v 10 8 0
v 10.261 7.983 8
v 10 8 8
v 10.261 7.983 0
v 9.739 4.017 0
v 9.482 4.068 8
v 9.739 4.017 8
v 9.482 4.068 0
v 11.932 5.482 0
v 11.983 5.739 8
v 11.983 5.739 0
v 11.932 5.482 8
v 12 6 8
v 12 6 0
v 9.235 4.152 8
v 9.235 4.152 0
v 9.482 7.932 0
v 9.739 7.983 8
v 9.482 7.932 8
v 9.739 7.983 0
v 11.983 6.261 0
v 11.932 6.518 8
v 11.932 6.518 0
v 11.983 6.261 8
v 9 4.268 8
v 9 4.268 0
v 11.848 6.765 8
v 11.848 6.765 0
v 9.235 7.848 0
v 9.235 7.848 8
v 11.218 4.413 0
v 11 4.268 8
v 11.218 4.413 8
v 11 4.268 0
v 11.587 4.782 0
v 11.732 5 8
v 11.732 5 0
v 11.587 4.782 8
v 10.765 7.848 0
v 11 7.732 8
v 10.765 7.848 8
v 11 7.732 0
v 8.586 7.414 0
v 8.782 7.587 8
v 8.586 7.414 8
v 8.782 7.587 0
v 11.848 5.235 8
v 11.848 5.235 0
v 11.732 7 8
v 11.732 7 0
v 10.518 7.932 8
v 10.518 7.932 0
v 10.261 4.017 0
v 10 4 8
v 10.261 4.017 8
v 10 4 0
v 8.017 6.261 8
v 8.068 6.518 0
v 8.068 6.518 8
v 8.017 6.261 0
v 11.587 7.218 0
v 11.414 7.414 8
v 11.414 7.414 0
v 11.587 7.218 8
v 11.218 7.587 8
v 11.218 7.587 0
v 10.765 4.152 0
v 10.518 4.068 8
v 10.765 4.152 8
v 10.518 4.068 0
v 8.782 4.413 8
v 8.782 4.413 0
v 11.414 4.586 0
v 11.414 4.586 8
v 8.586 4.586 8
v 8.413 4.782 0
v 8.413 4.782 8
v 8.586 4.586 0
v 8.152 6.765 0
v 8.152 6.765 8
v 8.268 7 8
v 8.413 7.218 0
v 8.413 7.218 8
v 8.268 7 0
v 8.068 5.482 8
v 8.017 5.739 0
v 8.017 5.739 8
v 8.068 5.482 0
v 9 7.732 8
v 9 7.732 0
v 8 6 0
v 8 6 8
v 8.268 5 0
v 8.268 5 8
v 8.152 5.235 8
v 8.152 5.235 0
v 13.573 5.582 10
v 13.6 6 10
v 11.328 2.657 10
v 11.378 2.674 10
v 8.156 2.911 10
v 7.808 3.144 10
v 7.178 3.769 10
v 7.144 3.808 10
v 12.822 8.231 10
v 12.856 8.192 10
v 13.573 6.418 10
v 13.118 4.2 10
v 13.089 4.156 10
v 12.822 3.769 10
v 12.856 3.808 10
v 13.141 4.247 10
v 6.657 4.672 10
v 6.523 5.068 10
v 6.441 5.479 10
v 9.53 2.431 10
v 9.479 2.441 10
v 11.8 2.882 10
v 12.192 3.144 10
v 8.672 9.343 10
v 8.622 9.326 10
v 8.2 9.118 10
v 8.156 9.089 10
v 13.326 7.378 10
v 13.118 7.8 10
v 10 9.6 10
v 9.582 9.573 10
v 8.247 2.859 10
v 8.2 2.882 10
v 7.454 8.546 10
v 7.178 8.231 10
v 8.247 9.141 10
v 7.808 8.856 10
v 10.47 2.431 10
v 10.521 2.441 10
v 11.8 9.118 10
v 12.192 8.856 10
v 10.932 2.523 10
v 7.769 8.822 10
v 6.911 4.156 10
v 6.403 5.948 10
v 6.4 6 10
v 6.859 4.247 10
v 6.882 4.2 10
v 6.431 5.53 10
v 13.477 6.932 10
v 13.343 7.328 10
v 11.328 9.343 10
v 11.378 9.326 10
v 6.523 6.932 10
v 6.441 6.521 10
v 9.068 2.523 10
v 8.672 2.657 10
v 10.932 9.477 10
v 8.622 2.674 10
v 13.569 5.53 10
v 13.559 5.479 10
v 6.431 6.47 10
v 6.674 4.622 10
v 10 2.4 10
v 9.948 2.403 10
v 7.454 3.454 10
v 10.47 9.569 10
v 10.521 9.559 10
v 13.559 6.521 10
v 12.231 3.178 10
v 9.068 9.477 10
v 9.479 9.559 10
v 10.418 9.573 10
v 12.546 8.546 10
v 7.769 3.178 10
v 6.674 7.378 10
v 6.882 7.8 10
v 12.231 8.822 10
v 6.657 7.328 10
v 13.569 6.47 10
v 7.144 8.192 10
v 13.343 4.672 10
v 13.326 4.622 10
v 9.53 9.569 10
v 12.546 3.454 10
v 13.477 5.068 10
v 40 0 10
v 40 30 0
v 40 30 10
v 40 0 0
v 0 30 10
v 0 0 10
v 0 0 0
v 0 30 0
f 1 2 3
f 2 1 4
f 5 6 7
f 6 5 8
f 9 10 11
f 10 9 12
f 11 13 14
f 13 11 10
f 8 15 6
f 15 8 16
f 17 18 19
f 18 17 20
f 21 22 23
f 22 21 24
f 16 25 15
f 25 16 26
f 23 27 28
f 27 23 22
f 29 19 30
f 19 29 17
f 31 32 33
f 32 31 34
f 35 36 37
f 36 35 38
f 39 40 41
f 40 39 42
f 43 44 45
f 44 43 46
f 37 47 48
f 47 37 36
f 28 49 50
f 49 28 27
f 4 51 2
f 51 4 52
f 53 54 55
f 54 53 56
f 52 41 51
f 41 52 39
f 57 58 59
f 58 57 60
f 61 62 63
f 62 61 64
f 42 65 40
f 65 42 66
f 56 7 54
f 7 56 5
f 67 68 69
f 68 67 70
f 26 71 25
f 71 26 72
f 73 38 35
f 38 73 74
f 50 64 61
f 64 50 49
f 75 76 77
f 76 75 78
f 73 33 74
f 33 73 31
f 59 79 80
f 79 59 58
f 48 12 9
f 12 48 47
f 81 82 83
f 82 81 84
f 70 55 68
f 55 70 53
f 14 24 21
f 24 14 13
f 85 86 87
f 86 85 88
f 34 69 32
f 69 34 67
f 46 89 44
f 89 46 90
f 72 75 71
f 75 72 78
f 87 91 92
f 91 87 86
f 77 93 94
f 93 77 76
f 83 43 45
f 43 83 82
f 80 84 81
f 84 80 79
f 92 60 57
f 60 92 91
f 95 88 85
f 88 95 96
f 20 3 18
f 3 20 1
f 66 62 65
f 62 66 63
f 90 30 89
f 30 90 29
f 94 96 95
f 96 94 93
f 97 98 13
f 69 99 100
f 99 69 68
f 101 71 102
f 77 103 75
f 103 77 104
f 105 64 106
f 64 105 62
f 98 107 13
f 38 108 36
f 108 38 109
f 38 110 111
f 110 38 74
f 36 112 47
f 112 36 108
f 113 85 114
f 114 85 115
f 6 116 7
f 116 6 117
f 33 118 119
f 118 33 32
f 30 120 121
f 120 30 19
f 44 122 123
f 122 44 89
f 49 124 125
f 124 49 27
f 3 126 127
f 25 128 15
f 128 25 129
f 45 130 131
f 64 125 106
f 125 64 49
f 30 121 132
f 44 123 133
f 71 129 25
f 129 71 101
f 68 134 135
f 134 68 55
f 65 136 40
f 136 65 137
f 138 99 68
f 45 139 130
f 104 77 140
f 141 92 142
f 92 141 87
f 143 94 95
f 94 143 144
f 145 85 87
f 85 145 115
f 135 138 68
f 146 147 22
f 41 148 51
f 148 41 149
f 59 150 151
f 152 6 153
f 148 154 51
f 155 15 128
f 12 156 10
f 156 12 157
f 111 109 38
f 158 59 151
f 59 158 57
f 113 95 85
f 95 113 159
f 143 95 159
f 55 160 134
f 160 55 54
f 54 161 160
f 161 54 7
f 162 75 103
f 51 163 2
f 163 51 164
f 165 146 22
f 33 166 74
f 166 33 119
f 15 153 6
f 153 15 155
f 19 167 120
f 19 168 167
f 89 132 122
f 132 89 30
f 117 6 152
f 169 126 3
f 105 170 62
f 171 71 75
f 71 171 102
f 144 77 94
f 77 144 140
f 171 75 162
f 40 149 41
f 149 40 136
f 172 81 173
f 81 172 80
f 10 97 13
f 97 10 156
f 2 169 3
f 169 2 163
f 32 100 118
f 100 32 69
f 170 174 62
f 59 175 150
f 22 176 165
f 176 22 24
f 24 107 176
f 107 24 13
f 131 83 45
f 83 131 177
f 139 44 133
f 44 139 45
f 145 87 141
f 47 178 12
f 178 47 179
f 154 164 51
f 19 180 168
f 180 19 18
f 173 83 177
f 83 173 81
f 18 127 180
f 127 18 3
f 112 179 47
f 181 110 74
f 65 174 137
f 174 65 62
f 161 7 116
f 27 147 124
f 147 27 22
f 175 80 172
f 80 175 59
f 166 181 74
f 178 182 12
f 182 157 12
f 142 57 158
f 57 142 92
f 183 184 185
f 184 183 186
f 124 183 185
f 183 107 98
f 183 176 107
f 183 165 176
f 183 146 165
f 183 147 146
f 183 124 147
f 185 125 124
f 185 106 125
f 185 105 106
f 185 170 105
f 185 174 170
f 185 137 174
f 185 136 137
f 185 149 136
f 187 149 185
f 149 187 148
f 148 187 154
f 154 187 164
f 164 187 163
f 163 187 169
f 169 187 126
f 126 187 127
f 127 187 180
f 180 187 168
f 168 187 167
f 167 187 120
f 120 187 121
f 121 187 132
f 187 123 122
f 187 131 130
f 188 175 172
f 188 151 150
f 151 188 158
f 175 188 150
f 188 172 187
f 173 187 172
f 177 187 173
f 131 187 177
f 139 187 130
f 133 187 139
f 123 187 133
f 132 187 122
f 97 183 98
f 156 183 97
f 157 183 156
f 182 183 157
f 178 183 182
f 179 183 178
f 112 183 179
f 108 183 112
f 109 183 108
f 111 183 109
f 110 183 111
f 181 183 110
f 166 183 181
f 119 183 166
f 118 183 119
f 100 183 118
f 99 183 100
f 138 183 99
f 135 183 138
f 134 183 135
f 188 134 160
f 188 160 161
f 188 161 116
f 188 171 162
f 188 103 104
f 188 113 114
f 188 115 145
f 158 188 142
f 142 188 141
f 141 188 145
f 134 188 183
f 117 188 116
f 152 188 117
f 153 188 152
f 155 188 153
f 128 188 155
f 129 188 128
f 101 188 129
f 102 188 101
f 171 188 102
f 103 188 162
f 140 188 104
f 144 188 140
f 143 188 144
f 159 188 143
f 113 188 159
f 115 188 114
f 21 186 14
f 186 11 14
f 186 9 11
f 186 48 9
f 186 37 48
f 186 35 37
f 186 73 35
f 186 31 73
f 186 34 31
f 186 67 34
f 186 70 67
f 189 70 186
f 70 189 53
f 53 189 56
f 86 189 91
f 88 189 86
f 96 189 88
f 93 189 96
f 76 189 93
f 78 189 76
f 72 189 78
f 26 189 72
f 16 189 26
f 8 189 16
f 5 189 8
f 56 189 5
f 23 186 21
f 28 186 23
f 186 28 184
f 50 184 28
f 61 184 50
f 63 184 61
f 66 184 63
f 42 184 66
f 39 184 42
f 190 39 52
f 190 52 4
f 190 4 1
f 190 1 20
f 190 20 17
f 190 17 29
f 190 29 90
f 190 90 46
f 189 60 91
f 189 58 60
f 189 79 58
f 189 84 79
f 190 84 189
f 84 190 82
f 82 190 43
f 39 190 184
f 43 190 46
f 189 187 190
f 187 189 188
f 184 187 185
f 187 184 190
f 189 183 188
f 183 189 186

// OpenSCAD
// units=mm — generated by scad_emitter.py
// part=unnamed
$fn = 48;

difference() { cube([40, 30, 10]); union() { translate([10, 6, 10.5]) rotate([180, 0, 0]) cylinder(h=11, r=2, $fn=$fn); translate([10, 6, 10.5]) rotate([180, 0, 0]) cylinder(h=2.5, r1=4, r2=2, $fn=$fn); } }
